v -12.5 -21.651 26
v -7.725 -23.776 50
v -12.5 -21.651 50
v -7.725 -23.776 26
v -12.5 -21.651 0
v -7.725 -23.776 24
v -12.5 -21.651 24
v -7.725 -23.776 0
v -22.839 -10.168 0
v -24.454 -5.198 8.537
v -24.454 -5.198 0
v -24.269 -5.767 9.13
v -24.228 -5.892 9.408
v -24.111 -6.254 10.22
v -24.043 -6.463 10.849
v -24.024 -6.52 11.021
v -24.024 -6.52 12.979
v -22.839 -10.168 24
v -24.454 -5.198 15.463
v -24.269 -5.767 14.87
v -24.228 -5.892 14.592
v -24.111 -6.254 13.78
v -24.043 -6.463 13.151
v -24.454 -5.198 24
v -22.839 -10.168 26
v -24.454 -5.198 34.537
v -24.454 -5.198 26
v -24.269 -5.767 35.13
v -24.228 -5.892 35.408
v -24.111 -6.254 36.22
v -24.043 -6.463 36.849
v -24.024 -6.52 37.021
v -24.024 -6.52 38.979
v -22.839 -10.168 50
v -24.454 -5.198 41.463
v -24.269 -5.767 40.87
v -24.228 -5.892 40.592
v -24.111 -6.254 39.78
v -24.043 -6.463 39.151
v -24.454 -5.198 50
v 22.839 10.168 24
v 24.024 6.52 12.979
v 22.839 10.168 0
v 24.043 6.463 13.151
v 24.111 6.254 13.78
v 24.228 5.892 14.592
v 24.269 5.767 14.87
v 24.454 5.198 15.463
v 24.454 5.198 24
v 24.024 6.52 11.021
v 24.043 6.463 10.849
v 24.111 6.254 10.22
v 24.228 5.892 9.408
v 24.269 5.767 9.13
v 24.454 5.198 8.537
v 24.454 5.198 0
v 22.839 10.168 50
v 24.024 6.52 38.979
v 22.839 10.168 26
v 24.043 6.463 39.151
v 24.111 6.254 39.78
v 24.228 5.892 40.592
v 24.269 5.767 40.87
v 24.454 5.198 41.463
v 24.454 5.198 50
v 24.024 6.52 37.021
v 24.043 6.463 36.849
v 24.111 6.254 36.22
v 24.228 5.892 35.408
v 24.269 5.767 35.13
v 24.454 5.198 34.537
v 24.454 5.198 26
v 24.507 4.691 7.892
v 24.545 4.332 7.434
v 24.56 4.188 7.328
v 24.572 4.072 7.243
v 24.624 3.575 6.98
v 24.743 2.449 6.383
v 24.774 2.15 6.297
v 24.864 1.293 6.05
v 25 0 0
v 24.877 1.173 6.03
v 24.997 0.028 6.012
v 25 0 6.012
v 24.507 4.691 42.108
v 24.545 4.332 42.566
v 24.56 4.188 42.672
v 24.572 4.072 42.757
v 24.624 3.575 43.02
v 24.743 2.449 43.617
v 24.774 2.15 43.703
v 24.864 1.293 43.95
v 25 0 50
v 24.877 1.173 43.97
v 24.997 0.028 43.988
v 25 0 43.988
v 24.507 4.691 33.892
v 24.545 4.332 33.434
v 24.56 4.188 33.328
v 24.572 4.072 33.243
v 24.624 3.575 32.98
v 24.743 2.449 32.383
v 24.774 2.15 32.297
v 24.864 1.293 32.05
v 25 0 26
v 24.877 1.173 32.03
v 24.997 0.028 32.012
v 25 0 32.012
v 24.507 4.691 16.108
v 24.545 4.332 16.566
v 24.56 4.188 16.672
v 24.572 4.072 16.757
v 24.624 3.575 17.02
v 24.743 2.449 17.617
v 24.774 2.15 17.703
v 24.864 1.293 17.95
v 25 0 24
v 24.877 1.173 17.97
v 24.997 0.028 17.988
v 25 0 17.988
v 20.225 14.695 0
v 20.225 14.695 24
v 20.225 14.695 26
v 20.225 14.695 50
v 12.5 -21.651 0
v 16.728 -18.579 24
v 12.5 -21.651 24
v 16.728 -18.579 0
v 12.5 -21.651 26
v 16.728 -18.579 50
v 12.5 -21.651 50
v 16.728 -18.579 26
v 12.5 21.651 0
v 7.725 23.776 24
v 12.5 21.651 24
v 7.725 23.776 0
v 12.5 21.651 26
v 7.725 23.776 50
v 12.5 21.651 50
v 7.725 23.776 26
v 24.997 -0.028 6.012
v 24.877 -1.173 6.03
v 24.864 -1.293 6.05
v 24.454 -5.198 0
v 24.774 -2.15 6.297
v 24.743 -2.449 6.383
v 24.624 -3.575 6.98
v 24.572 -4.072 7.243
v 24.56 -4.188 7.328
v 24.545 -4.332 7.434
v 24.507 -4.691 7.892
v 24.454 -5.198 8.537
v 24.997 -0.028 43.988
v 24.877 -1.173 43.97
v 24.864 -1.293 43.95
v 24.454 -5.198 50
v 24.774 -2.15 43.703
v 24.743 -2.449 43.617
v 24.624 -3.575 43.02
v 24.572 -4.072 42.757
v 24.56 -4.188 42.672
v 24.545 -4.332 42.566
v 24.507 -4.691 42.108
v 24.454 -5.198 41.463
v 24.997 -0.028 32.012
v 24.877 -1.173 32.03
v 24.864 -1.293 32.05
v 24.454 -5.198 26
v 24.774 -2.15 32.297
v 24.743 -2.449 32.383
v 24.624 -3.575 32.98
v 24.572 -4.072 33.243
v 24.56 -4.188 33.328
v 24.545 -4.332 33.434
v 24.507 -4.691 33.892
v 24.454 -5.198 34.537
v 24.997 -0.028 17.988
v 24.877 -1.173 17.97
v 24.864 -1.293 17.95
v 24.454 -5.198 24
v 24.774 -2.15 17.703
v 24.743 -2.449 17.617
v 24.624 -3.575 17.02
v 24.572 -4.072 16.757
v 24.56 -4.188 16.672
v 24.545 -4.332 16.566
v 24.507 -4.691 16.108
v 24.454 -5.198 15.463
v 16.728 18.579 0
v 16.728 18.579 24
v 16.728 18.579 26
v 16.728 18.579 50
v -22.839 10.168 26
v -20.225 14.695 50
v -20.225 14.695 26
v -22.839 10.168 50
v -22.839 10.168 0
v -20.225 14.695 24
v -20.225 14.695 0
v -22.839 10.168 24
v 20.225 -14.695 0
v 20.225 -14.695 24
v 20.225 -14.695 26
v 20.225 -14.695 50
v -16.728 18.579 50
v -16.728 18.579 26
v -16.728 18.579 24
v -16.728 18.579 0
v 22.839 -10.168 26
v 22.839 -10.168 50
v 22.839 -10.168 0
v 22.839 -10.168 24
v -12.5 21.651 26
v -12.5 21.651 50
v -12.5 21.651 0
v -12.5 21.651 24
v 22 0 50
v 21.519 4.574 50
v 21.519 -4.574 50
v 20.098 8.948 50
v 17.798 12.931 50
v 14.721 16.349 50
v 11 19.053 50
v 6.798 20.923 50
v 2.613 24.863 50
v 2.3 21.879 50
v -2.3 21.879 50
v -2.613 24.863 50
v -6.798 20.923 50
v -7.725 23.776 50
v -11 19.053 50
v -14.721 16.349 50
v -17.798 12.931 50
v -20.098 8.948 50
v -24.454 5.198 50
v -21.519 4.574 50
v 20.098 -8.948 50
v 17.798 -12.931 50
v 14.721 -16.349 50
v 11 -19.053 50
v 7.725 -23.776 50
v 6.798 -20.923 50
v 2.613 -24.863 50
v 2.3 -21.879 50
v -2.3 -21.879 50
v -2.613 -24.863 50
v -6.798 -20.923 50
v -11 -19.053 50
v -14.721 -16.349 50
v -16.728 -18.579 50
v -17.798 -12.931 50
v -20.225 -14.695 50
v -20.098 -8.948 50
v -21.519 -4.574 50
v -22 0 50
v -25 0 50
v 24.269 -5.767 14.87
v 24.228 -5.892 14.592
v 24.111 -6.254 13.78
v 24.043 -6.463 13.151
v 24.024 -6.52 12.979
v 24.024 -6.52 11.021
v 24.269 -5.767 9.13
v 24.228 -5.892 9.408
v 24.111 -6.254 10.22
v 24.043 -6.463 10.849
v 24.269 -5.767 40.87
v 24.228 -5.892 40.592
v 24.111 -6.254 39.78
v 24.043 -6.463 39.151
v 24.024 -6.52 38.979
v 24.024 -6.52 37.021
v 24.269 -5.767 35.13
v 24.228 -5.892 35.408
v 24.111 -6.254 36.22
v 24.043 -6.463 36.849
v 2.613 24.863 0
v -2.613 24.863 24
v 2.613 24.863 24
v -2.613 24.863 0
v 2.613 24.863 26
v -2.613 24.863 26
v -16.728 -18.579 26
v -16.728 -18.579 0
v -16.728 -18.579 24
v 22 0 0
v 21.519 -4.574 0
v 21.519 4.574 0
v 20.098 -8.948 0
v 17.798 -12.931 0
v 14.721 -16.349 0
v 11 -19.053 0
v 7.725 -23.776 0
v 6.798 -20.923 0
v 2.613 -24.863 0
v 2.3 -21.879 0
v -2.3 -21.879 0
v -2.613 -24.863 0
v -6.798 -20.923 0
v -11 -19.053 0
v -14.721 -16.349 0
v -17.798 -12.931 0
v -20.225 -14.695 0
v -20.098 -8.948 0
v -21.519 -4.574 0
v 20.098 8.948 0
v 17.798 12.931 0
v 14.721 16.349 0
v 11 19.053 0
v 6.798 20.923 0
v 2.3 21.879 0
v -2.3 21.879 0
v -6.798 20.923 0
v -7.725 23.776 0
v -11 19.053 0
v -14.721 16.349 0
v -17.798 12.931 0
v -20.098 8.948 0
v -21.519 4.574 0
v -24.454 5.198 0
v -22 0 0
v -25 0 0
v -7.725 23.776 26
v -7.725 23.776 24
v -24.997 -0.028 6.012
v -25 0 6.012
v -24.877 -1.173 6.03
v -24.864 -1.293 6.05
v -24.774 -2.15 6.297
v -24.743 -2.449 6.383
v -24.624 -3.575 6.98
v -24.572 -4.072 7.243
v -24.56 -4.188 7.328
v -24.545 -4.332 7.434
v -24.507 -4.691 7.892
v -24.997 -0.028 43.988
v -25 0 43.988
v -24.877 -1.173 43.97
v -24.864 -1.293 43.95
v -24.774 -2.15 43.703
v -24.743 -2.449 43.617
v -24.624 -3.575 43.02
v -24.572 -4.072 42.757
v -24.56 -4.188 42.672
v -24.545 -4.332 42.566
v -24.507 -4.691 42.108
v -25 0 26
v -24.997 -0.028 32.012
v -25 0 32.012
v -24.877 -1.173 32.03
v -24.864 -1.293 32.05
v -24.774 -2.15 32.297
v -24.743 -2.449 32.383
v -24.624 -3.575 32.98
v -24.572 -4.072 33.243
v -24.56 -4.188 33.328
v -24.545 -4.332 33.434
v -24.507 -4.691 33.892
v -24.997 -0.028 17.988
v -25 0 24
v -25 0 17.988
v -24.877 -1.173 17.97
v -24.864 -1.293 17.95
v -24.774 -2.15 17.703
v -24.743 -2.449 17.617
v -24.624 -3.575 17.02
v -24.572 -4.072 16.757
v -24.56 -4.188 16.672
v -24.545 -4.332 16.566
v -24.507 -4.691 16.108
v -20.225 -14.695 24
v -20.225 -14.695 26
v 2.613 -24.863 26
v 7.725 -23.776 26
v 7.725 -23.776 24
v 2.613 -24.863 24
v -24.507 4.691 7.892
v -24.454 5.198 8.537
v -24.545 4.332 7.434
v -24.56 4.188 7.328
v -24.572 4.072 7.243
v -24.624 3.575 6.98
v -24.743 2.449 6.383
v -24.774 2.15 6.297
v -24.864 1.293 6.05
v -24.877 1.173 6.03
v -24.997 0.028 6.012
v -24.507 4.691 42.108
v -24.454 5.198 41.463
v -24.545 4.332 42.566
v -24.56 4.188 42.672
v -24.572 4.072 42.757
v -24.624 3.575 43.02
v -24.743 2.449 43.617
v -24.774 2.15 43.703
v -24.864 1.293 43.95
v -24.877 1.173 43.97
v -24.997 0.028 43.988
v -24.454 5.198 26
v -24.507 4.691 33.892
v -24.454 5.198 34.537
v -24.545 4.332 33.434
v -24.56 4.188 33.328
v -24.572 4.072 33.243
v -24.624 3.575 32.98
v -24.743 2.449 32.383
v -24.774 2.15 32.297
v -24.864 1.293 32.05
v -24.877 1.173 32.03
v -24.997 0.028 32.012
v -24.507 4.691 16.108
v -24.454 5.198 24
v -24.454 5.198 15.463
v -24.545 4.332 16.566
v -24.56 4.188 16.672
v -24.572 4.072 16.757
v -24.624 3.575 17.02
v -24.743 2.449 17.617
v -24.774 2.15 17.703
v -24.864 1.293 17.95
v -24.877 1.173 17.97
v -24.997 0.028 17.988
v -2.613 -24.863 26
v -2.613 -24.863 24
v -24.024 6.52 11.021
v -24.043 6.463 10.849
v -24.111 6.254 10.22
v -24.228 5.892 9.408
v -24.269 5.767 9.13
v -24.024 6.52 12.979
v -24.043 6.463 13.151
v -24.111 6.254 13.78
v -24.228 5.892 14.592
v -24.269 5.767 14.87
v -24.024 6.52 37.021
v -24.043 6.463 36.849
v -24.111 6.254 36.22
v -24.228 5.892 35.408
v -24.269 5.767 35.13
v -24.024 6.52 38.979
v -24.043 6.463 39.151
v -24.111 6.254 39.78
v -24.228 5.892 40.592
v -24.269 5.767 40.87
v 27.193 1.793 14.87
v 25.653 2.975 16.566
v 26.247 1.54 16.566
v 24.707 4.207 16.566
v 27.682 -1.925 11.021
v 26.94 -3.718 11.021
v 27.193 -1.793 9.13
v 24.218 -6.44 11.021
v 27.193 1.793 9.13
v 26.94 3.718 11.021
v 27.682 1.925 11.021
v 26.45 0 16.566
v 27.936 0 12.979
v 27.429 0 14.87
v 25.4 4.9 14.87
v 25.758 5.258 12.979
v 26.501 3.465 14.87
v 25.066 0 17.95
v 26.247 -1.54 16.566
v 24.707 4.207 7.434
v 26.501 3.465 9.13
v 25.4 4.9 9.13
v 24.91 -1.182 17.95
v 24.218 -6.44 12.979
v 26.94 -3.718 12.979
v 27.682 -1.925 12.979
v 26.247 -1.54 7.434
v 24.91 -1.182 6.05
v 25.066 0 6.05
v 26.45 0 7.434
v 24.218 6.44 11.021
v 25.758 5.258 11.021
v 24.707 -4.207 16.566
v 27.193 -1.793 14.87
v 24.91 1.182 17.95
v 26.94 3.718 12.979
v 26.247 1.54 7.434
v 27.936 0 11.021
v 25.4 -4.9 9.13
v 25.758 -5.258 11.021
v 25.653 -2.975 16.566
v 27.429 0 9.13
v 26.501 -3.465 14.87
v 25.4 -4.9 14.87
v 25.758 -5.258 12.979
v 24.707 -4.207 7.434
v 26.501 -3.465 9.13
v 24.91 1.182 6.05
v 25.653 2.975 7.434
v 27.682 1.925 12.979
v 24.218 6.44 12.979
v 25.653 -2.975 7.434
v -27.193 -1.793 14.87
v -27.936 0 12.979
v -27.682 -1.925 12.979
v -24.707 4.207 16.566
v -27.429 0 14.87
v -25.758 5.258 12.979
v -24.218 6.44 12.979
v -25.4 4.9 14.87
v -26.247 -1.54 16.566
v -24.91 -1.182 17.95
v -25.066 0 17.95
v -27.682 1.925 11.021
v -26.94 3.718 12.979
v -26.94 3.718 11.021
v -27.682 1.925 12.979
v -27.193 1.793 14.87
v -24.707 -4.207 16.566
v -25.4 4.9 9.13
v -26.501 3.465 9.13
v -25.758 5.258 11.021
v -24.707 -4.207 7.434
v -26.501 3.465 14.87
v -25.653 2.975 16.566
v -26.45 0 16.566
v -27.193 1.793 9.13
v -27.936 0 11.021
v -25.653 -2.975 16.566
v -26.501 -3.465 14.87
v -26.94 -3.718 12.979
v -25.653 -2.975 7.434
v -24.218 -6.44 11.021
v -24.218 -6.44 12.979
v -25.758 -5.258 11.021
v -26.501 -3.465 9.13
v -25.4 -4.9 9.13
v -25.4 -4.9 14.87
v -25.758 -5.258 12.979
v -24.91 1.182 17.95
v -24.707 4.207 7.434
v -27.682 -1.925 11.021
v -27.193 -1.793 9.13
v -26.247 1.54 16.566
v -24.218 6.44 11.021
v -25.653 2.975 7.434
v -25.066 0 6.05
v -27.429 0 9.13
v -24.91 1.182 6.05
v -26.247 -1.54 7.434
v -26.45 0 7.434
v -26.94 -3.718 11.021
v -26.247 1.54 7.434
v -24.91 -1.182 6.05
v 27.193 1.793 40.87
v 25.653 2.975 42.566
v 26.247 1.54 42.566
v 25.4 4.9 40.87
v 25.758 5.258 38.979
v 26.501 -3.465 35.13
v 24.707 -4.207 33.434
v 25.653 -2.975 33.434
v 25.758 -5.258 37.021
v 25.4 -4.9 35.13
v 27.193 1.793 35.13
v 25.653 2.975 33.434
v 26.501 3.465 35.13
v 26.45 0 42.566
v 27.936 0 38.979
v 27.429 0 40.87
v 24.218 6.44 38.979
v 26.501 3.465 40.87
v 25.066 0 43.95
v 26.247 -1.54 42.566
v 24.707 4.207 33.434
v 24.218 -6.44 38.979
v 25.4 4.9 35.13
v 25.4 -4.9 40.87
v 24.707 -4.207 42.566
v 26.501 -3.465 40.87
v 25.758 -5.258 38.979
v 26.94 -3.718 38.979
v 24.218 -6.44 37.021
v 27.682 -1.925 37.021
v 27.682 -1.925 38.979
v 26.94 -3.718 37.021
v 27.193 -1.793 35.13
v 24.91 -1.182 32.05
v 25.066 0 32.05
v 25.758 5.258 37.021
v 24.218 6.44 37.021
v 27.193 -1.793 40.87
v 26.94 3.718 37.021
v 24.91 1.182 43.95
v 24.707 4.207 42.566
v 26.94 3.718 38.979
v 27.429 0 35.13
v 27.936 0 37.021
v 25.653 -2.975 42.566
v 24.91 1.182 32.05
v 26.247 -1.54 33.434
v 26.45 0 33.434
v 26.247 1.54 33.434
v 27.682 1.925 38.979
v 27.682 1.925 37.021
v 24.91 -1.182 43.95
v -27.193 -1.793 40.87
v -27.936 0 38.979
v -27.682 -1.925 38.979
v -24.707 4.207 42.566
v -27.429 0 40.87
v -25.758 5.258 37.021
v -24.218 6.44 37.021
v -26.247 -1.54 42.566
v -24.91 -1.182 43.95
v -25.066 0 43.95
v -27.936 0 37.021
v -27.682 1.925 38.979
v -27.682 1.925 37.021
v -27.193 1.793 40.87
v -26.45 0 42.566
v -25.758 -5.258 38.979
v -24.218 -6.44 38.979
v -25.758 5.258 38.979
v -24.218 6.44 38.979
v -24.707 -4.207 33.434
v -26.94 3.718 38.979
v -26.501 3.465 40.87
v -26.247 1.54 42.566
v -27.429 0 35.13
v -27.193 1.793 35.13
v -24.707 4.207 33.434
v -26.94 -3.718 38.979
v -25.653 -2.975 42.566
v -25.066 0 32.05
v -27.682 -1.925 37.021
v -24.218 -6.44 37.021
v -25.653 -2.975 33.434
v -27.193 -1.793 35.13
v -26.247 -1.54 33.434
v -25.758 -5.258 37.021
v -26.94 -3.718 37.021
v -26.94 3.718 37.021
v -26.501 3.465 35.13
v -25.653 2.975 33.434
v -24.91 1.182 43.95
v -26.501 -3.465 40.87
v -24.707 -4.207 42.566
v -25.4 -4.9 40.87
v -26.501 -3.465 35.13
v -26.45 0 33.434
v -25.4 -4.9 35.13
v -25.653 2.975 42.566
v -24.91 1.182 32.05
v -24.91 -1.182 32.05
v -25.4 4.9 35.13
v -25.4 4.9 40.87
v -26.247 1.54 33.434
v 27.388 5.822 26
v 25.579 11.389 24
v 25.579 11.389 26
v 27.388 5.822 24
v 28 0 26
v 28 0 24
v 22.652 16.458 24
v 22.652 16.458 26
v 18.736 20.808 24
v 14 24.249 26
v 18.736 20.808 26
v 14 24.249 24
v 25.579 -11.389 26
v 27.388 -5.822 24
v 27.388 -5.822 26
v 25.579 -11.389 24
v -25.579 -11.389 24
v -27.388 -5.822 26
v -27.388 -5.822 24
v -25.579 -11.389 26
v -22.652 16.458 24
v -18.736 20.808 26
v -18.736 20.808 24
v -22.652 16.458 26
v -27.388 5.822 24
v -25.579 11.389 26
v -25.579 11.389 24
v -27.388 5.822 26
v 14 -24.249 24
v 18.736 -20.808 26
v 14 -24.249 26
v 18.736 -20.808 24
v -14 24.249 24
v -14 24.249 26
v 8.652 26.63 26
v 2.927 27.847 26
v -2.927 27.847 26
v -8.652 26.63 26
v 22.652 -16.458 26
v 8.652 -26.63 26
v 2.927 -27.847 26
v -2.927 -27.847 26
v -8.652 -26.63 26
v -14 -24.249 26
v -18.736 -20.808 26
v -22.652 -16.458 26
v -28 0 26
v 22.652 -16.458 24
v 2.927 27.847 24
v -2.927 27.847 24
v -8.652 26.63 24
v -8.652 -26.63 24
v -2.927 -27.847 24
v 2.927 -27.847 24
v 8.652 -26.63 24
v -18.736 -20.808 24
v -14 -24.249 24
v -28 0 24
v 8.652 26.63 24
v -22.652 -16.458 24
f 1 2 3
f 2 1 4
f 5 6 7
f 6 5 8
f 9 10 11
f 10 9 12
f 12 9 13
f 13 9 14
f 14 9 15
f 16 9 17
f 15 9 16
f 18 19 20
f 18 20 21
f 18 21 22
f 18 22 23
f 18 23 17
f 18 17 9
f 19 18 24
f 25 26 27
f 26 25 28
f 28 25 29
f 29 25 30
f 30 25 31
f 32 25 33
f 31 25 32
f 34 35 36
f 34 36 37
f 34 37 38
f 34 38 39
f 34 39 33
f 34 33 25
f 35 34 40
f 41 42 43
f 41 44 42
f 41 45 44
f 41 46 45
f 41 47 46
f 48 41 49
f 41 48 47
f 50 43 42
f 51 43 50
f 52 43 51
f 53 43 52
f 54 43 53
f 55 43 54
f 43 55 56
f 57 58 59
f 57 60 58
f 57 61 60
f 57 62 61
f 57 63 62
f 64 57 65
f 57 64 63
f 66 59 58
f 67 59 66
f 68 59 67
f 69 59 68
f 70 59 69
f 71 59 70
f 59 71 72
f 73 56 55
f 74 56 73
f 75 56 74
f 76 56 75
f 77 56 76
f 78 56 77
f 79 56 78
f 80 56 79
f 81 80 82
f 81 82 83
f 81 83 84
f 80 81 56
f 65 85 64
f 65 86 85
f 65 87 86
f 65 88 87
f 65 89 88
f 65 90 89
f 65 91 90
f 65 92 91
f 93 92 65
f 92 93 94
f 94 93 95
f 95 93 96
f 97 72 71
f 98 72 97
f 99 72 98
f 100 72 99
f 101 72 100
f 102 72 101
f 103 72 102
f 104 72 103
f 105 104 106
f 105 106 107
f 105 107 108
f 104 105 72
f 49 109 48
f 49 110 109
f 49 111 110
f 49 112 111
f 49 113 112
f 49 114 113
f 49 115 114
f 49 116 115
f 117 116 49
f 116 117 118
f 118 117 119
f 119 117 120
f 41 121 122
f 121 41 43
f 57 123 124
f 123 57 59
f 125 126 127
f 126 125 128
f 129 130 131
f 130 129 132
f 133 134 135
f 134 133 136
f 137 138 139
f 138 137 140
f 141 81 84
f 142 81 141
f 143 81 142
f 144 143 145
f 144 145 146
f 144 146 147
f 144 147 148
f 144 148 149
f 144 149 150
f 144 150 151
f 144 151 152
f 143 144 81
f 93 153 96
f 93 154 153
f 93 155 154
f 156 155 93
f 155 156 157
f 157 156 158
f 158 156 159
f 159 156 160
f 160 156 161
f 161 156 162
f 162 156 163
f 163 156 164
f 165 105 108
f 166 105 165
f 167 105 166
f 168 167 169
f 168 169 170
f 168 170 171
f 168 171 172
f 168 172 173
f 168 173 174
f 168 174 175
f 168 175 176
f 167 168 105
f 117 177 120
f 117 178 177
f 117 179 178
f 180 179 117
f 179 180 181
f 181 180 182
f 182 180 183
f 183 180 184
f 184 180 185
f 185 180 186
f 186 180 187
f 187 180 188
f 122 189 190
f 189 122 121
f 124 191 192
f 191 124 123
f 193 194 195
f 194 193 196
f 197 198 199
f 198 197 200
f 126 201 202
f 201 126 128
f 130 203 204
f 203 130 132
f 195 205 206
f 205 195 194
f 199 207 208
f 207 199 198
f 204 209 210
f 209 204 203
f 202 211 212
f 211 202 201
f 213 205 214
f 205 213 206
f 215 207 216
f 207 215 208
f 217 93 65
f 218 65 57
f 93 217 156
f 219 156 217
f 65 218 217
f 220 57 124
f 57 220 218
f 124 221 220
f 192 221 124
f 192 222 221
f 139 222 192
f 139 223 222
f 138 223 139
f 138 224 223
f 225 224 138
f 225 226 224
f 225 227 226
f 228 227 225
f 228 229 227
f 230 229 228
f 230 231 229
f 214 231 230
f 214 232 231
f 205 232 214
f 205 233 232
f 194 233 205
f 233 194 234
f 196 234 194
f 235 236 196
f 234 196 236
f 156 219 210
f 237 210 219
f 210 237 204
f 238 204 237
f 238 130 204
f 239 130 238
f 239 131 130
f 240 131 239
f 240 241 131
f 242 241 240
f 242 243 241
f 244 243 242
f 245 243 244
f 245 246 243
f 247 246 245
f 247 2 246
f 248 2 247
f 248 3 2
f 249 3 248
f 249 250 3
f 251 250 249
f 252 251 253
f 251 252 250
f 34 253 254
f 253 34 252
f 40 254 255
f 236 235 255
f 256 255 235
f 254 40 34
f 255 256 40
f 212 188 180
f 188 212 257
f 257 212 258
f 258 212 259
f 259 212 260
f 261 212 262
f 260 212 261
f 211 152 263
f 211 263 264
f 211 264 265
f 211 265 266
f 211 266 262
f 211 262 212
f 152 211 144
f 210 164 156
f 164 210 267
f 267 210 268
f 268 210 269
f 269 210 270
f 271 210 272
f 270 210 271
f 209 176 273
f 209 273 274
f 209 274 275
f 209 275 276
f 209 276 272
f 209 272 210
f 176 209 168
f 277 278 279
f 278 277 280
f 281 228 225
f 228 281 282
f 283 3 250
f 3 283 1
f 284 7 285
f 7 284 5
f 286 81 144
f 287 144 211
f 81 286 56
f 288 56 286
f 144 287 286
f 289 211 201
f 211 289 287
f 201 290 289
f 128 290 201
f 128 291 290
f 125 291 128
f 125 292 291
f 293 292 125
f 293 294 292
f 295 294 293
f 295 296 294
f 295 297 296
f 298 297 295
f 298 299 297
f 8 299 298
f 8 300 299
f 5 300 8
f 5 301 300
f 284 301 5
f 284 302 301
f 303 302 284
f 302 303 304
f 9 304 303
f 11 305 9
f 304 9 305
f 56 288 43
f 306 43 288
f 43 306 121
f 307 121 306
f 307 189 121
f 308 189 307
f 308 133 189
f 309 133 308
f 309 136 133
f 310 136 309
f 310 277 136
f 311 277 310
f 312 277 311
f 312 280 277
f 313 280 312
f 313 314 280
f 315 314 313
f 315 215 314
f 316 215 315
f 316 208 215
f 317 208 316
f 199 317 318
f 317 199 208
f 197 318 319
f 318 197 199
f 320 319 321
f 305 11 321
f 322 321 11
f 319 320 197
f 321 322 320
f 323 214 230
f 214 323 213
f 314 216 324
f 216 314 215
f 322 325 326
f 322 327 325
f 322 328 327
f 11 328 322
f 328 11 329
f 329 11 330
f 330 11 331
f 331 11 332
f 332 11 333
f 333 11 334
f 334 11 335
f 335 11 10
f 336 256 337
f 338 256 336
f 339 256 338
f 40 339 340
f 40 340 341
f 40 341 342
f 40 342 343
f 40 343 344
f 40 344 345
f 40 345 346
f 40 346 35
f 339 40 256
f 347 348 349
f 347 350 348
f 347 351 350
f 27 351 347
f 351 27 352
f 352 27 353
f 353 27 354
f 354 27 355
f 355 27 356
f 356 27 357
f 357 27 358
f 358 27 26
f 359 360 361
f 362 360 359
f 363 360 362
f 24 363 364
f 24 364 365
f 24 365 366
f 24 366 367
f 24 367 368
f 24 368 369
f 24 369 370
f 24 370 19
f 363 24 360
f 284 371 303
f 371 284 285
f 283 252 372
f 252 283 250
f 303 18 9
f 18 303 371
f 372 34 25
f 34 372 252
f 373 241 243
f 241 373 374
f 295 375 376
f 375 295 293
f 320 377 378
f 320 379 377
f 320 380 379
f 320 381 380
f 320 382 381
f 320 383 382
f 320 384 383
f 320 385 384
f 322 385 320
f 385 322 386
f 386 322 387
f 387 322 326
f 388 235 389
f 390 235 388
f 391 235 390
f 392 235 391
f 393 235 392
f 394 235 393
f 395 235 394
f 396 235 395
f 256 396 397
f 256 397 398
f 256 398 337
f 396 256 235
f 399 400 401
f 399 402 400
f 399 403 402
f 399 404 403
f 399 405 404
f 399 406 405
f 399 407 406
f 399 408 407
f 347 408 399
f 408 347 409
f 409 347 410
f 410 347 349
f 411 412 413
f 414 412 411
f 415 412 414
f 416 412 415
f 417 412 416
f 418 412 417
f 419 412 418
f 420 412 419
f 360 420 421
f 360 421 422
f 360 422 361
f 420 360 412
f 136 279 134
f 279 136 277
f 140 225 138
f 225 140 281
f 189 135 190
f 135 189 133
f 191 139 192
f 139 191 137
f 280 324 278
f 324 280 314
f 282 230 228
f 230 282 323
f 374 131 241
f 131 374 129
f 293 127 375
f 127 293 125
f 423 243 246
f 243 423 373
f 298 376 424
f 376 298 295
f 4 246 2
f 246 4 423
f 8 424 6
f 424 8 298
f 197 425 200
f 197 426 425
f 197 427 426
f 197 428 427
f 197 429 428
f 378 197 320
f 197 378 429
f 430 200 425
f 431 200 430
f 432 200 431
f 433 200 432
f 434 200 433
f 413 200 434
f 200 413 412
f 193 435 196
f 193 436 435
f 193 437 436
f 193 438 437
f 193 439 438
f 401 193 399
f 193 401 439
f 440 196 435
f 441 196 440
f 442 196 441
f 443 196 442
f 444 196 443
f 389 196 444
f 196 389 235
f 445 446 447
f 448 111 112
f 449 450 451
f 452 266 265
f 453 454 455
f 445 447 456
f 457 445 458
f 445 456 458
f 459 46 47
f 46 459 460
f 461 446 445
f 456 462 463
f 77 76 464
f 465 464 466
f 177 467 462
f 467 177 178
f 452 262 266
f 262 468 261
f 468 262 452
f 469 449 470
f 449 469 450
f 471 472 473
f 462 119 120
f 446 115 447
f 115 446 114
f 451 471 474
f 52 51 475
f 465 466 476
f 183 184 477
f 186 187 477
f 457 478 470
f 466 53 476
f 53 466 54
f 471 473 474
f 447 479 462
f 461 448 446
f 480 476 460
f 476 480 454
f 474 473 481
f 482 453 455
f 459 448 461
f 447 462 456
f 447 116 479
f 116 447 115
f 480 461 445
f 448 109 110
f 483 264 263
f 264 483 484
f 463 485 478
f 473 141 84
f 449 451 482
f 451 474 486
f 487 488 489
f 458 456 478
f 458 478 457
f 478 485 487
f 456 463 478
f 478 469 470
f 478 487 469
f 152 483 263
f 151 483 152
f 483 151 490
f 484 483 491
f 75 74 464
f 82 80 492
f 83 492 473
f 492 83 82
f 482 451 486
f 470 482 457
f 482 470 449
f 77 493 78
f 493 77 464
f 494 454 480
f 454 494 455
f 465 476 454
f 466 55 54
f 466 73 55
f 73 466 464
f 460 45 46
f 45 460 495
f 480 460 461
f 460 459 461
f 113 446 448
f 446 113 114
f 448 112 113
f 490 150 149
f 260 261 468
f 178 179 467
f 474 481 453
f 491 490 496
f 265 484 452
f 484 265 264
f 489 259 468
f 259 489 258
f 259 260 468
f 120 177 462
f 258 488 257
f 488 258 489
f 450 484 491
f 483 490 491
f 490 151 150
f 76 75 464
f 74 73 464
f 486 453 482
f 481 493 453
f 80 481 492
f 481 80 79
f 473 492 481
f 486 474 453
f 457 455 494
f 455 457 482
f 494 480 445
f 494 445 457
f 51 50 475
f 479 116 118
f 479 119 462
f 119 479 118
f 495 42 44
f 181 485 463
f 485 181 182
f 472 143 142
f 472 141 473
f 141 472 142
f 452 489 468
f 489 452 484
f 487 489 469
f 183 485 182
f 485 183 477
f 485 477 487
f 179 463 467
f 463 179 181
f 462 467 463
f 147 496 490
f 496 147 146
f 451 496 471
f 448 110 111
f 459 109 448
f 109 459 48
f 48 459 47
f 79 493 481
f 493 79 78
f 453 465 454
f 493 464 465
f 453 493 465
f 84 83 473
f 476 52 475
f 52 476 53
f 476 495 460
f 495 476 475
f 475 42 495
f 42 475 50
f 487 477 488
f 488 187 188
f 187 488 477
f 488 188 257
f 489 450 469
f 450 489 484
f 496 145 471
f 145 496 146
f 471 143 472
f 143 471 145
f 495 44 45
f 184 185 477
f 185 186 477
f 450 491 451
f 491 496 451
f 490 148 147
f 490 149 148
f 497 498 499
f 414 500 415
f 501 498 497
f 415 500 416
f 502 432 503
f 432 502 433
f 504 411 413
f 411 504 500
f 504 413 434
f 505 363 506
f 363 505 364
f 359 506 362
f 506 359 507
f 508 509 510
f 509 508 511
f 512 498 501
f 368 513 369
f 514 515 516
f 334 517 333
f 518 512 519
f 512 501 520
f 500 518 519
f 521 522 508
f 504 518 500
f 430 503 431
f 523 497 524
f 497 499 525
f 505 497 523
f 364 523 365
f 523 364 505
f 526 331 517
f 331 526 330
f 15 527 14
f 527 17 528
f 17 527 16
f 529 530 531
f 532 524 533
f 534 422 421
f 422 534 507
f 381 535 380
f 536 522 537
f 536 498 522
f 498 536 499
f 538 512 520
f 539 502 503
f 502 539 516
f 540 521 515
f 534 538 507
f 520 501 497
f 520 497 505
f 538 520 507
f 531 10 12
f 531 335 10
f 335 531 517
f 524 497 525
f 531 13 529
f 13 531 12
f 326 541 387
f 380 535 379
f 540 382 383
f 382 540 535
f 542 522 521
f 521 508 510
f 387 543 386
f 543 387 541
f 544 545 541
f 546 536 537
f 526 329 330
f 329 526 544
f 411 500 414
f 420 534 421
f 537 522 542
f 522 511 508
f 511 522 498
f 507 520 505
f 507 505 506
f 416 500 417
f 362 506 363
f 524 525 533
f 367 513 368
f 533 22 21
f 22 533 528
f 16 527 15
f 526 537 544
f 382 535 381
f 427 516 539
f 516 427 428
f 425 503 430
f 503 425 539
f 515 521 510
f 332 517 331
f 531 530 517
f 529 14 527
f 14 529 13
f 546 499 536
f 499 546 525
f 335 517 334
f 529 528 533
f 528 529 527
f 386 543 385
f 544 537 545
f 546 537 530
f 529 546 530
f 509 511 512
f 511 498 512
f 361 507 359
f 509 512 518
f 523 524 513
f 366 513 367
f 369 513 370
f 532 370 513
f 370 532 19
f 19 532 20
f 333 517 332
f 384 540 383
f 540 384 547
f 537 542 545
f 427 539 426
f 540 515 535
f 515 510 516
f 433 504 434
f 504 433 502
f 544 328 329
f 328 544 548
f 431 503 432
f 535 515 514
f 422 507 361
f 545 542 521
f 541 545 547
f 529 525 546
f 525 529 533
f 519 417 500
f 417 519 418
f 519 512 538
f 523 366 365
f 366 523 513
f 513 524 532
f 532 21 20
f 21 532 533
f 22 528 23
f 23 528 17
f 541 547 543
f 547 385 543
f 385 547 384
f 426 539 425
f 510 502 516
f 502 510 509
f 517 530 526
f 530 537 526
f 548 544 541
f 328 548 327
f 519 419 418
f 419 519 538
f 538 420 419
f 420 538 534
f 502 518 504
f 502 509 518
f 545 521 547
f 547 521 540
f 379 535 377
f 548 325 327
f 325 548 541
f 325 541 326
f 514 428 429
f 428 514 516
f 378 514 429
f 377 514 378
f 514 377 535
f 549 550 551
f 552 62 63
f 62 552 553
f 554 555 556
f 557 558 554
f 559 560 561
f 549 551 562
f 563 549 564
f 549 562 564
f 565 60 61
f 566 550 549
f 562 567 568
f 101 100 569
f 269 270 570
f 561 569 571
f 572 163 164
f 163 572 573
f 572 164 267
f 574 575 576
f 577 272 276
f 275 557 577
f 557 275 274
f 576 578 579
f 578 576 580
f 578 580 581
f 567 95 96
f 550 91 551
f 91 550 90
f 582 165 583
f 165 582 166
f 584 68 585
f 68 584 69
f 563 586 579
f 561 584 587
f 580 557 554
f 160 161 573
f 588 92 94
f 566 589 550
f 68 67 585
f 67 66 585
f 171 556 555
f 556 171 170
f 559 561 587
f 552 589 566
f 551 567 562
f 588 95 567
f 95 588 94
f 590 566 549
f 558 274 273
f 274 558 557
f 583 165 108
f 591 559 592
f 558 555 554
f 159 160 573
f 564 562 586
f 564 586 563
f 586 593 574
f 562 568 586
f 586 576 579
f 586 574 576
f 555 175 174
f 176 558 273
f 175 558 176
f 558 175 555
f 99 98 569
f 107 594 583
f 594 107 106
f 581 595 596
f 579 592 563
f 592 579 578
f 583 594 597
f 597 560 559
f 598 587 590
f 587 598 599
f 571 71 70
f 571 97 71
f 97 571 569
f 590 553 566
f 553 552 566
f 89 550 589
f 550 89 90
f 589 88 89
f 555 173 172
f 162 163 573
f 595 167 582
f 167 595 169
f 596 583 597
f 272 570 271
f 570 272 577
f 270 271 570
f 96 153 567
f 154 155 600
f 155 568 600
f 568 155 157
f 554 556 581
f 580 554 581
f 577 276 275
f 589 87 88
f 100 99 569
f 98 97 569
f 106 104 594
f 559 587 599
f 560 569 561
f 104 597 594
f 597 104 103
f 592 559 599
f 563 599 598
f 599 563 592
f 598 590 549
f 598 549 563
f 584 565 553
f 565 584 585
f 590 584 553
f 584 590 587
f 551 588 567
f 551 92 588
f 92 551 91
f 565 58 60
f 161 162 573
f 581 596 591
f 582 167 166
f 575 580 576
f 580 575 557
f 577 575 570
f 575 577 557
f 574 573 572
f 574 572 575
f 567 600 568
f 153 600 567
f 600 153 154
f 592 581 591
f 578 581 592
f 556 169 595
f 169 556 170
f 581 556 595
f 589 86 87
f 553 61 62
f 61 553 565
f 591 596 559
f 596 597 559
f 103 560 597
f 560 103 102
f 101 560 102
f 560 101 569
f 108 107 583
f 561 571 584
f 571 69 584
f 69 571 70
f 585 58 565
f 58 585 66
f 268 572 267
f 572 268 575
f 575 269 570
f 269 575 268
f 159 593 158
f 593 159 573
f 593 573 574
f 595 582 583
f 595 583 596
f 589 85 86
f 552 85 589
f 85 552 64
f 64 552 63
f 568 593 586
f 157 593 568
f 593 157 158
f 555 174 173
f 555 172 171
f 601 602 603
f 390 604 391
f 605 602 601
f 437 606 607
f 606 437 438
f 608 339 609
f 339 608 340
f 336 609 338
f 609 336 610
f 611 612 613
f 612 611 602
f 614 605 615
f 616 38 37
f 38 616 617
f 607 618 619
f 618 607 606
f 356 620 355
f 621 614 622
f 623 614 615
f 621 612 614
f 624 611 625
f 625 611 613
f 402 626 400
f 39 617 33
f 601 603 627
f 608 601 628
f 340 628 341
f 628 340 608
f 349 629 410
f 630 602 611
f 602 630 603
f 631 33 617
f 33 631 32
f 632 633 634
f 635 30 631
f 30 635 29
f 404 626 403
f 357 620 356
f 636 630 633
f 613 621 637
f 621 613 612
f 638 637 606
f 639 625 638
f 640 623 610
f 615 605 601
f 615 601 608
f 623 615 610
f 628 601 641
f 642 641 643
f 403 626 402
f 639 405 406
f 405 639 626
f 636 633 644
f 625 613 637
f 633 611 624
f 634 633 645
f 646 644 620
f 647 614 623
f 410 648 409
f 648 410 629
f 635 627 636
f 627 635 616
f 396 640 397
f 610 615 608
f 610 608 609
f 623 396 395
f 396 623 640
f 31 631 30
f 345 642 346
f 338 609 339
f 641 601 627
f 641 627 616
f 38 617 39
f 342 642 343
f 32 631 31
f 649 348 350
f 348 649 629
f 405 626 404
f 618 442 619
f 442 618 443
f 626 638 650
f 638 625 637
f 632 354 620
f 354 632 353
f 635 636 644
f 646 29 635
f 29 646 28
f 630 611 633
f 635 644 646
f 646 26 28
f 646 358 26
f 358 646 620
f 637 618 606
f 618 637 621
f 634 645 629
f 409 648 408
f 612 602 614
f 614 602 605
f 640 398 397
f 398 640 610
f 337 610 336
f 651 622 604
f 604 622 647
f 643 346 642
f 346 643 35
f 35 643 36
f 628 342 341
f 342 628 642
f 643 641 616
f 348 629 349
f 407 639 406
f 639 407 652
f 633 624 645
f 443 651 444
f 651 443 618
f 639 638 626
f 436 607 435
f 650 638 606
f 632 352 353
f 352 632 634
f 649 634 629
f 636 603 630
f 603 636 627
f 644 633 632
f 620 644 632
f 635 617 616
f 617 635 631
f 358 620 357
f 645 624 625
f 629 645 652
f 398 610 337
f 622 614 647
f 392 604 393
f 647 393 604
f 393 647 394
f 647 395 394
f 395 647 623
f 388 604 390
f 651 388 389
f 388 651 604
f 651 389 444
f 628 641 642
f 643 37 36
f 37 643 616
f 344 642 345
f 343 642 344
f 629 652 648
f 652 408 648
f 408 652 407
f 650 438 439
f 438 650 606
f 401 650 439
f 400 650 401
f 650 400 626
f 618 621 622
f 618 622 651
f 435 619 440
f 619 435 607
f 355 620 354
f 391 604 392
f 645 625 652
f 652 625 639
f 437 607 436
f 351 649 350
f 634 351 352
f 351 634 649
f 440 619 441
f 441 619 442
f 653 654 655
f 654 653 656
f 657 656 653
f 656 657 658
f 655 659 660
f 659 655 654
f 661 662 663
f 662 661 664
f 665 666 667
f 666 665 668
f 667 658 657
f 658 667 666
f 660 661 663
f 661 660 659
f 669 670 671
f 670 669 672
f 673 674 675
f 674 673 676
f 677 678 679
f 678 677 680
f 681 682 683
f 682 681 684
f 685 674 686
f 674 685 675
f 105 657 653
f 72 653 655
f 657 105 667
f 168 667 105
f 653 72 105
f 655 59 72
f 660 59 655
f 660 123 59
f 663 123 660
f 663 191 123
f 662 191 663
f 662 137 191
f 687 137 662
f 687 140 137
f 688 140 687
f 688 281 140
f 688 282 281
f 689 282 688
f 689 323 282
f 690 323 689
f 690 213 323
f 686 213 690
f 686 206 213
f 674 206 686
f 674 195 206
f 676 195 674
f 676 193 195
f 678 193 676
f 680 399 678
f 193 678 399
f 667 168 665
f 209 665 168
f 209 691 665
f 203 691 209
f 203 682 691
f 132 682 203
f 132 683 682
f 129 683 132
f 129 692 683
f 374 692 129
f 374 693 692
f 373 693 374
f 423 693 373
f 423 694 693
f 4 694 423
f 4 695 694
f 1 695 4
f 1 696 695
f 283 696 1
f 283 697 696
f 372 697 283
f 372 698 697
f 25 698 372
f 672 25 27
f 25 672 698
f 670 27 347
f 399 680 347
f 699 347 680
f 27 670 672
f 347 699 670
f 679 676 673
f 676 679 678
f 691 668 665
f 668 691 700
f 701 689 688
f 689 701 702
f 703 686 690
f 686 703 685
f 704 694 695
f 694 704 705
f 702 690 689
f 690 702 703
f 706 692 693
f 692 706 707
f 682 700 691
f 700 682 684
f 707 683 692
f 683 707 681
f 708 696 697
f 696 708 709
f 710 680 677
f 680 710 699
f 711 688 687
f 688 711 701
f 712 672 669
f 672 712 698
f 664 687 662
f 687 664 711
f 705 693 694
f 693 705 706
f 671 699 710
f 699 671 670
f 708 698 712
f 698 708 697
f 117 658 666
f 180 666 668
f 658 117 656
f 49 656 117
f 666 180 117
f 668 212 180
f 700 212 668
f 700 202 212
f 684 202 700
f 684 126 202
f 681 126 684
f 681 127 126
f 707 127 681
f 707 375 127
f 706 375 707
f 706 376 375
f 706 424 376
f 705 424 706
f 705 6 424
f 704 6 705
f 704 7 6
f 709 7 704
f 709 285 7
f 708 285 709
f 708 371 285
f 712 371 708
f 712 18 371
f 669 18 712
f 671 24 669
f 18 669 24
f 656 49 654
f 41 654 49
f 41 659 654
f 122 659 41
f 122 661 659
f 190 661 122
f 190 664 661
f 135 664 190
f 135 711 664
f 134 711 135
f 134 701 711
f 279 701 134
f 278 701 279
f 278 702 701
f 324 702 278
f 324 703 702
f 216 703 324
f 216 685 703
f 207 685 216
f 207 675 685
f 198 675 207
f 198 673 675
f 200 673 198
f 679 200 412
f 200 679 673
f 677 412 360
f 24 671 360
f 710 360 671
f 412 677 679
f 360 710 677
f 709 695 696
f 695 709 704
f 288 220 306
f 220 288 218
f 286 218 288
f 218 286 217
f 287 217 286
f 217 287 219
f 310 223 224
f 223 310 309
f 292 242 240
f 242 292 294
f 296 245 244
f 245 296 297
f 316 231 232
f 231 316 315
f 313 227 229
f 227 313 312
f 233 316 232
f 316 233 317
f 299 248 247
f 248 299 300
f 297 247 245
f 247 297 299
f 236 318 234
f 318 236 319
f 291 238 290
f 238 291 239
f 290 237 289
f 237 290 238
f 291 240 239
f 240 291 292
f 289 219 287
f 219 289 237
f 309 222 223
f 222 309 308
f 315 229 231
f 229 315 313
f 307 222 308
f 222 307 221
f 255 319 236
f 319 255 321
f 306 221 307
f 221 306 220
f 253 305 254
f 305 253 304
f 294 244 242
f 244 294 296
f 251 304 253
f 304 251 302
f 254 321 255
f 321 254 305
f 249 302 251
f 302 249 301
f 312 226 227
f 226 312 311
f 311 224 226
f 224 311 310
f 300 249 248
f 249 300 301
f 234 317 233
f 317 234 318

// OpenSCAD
prumerVenk = 25;
Vyska = 50;
Stena = 3;
Okrouzek = 28;
OkrouzekH = 2;
KulickaOdOkraje = 12;



module puntik(x, y, z, r)
{
	translate([x, y, z]) {
		sphere(r=r);
	}
}

module obrys(){
	cylinder(h=Vyska, r=prumerVenk);
	puntik((prumerVenk-4.5), 0, KulickaOdOkraje, 7.5);
	puntik(-(prumerVenk-4.5), 0, KulickaOdOkraje, 7.5);
	puntik((prumerVenk-4.5), 0, Vyska-KulickaOdOkraje, 7.5);
	puntik(-(prumerVenk-4.5), 0, Vyska-KulickaOdOkraje, 7.5);

	translate([0, 0, ((Vyska/2) - (OkrouzekH/2))]) {
		cylinder(h=OkrouzekH, r=Okrouzek);
	}
}

module Adapter()
{
	difference(){
		obrys();
		translate([0, 0, -1]) {
			cylinder(h=Vyska+2, r=(prumerVenk-Stena));
		}
	}
}

Adapter();
